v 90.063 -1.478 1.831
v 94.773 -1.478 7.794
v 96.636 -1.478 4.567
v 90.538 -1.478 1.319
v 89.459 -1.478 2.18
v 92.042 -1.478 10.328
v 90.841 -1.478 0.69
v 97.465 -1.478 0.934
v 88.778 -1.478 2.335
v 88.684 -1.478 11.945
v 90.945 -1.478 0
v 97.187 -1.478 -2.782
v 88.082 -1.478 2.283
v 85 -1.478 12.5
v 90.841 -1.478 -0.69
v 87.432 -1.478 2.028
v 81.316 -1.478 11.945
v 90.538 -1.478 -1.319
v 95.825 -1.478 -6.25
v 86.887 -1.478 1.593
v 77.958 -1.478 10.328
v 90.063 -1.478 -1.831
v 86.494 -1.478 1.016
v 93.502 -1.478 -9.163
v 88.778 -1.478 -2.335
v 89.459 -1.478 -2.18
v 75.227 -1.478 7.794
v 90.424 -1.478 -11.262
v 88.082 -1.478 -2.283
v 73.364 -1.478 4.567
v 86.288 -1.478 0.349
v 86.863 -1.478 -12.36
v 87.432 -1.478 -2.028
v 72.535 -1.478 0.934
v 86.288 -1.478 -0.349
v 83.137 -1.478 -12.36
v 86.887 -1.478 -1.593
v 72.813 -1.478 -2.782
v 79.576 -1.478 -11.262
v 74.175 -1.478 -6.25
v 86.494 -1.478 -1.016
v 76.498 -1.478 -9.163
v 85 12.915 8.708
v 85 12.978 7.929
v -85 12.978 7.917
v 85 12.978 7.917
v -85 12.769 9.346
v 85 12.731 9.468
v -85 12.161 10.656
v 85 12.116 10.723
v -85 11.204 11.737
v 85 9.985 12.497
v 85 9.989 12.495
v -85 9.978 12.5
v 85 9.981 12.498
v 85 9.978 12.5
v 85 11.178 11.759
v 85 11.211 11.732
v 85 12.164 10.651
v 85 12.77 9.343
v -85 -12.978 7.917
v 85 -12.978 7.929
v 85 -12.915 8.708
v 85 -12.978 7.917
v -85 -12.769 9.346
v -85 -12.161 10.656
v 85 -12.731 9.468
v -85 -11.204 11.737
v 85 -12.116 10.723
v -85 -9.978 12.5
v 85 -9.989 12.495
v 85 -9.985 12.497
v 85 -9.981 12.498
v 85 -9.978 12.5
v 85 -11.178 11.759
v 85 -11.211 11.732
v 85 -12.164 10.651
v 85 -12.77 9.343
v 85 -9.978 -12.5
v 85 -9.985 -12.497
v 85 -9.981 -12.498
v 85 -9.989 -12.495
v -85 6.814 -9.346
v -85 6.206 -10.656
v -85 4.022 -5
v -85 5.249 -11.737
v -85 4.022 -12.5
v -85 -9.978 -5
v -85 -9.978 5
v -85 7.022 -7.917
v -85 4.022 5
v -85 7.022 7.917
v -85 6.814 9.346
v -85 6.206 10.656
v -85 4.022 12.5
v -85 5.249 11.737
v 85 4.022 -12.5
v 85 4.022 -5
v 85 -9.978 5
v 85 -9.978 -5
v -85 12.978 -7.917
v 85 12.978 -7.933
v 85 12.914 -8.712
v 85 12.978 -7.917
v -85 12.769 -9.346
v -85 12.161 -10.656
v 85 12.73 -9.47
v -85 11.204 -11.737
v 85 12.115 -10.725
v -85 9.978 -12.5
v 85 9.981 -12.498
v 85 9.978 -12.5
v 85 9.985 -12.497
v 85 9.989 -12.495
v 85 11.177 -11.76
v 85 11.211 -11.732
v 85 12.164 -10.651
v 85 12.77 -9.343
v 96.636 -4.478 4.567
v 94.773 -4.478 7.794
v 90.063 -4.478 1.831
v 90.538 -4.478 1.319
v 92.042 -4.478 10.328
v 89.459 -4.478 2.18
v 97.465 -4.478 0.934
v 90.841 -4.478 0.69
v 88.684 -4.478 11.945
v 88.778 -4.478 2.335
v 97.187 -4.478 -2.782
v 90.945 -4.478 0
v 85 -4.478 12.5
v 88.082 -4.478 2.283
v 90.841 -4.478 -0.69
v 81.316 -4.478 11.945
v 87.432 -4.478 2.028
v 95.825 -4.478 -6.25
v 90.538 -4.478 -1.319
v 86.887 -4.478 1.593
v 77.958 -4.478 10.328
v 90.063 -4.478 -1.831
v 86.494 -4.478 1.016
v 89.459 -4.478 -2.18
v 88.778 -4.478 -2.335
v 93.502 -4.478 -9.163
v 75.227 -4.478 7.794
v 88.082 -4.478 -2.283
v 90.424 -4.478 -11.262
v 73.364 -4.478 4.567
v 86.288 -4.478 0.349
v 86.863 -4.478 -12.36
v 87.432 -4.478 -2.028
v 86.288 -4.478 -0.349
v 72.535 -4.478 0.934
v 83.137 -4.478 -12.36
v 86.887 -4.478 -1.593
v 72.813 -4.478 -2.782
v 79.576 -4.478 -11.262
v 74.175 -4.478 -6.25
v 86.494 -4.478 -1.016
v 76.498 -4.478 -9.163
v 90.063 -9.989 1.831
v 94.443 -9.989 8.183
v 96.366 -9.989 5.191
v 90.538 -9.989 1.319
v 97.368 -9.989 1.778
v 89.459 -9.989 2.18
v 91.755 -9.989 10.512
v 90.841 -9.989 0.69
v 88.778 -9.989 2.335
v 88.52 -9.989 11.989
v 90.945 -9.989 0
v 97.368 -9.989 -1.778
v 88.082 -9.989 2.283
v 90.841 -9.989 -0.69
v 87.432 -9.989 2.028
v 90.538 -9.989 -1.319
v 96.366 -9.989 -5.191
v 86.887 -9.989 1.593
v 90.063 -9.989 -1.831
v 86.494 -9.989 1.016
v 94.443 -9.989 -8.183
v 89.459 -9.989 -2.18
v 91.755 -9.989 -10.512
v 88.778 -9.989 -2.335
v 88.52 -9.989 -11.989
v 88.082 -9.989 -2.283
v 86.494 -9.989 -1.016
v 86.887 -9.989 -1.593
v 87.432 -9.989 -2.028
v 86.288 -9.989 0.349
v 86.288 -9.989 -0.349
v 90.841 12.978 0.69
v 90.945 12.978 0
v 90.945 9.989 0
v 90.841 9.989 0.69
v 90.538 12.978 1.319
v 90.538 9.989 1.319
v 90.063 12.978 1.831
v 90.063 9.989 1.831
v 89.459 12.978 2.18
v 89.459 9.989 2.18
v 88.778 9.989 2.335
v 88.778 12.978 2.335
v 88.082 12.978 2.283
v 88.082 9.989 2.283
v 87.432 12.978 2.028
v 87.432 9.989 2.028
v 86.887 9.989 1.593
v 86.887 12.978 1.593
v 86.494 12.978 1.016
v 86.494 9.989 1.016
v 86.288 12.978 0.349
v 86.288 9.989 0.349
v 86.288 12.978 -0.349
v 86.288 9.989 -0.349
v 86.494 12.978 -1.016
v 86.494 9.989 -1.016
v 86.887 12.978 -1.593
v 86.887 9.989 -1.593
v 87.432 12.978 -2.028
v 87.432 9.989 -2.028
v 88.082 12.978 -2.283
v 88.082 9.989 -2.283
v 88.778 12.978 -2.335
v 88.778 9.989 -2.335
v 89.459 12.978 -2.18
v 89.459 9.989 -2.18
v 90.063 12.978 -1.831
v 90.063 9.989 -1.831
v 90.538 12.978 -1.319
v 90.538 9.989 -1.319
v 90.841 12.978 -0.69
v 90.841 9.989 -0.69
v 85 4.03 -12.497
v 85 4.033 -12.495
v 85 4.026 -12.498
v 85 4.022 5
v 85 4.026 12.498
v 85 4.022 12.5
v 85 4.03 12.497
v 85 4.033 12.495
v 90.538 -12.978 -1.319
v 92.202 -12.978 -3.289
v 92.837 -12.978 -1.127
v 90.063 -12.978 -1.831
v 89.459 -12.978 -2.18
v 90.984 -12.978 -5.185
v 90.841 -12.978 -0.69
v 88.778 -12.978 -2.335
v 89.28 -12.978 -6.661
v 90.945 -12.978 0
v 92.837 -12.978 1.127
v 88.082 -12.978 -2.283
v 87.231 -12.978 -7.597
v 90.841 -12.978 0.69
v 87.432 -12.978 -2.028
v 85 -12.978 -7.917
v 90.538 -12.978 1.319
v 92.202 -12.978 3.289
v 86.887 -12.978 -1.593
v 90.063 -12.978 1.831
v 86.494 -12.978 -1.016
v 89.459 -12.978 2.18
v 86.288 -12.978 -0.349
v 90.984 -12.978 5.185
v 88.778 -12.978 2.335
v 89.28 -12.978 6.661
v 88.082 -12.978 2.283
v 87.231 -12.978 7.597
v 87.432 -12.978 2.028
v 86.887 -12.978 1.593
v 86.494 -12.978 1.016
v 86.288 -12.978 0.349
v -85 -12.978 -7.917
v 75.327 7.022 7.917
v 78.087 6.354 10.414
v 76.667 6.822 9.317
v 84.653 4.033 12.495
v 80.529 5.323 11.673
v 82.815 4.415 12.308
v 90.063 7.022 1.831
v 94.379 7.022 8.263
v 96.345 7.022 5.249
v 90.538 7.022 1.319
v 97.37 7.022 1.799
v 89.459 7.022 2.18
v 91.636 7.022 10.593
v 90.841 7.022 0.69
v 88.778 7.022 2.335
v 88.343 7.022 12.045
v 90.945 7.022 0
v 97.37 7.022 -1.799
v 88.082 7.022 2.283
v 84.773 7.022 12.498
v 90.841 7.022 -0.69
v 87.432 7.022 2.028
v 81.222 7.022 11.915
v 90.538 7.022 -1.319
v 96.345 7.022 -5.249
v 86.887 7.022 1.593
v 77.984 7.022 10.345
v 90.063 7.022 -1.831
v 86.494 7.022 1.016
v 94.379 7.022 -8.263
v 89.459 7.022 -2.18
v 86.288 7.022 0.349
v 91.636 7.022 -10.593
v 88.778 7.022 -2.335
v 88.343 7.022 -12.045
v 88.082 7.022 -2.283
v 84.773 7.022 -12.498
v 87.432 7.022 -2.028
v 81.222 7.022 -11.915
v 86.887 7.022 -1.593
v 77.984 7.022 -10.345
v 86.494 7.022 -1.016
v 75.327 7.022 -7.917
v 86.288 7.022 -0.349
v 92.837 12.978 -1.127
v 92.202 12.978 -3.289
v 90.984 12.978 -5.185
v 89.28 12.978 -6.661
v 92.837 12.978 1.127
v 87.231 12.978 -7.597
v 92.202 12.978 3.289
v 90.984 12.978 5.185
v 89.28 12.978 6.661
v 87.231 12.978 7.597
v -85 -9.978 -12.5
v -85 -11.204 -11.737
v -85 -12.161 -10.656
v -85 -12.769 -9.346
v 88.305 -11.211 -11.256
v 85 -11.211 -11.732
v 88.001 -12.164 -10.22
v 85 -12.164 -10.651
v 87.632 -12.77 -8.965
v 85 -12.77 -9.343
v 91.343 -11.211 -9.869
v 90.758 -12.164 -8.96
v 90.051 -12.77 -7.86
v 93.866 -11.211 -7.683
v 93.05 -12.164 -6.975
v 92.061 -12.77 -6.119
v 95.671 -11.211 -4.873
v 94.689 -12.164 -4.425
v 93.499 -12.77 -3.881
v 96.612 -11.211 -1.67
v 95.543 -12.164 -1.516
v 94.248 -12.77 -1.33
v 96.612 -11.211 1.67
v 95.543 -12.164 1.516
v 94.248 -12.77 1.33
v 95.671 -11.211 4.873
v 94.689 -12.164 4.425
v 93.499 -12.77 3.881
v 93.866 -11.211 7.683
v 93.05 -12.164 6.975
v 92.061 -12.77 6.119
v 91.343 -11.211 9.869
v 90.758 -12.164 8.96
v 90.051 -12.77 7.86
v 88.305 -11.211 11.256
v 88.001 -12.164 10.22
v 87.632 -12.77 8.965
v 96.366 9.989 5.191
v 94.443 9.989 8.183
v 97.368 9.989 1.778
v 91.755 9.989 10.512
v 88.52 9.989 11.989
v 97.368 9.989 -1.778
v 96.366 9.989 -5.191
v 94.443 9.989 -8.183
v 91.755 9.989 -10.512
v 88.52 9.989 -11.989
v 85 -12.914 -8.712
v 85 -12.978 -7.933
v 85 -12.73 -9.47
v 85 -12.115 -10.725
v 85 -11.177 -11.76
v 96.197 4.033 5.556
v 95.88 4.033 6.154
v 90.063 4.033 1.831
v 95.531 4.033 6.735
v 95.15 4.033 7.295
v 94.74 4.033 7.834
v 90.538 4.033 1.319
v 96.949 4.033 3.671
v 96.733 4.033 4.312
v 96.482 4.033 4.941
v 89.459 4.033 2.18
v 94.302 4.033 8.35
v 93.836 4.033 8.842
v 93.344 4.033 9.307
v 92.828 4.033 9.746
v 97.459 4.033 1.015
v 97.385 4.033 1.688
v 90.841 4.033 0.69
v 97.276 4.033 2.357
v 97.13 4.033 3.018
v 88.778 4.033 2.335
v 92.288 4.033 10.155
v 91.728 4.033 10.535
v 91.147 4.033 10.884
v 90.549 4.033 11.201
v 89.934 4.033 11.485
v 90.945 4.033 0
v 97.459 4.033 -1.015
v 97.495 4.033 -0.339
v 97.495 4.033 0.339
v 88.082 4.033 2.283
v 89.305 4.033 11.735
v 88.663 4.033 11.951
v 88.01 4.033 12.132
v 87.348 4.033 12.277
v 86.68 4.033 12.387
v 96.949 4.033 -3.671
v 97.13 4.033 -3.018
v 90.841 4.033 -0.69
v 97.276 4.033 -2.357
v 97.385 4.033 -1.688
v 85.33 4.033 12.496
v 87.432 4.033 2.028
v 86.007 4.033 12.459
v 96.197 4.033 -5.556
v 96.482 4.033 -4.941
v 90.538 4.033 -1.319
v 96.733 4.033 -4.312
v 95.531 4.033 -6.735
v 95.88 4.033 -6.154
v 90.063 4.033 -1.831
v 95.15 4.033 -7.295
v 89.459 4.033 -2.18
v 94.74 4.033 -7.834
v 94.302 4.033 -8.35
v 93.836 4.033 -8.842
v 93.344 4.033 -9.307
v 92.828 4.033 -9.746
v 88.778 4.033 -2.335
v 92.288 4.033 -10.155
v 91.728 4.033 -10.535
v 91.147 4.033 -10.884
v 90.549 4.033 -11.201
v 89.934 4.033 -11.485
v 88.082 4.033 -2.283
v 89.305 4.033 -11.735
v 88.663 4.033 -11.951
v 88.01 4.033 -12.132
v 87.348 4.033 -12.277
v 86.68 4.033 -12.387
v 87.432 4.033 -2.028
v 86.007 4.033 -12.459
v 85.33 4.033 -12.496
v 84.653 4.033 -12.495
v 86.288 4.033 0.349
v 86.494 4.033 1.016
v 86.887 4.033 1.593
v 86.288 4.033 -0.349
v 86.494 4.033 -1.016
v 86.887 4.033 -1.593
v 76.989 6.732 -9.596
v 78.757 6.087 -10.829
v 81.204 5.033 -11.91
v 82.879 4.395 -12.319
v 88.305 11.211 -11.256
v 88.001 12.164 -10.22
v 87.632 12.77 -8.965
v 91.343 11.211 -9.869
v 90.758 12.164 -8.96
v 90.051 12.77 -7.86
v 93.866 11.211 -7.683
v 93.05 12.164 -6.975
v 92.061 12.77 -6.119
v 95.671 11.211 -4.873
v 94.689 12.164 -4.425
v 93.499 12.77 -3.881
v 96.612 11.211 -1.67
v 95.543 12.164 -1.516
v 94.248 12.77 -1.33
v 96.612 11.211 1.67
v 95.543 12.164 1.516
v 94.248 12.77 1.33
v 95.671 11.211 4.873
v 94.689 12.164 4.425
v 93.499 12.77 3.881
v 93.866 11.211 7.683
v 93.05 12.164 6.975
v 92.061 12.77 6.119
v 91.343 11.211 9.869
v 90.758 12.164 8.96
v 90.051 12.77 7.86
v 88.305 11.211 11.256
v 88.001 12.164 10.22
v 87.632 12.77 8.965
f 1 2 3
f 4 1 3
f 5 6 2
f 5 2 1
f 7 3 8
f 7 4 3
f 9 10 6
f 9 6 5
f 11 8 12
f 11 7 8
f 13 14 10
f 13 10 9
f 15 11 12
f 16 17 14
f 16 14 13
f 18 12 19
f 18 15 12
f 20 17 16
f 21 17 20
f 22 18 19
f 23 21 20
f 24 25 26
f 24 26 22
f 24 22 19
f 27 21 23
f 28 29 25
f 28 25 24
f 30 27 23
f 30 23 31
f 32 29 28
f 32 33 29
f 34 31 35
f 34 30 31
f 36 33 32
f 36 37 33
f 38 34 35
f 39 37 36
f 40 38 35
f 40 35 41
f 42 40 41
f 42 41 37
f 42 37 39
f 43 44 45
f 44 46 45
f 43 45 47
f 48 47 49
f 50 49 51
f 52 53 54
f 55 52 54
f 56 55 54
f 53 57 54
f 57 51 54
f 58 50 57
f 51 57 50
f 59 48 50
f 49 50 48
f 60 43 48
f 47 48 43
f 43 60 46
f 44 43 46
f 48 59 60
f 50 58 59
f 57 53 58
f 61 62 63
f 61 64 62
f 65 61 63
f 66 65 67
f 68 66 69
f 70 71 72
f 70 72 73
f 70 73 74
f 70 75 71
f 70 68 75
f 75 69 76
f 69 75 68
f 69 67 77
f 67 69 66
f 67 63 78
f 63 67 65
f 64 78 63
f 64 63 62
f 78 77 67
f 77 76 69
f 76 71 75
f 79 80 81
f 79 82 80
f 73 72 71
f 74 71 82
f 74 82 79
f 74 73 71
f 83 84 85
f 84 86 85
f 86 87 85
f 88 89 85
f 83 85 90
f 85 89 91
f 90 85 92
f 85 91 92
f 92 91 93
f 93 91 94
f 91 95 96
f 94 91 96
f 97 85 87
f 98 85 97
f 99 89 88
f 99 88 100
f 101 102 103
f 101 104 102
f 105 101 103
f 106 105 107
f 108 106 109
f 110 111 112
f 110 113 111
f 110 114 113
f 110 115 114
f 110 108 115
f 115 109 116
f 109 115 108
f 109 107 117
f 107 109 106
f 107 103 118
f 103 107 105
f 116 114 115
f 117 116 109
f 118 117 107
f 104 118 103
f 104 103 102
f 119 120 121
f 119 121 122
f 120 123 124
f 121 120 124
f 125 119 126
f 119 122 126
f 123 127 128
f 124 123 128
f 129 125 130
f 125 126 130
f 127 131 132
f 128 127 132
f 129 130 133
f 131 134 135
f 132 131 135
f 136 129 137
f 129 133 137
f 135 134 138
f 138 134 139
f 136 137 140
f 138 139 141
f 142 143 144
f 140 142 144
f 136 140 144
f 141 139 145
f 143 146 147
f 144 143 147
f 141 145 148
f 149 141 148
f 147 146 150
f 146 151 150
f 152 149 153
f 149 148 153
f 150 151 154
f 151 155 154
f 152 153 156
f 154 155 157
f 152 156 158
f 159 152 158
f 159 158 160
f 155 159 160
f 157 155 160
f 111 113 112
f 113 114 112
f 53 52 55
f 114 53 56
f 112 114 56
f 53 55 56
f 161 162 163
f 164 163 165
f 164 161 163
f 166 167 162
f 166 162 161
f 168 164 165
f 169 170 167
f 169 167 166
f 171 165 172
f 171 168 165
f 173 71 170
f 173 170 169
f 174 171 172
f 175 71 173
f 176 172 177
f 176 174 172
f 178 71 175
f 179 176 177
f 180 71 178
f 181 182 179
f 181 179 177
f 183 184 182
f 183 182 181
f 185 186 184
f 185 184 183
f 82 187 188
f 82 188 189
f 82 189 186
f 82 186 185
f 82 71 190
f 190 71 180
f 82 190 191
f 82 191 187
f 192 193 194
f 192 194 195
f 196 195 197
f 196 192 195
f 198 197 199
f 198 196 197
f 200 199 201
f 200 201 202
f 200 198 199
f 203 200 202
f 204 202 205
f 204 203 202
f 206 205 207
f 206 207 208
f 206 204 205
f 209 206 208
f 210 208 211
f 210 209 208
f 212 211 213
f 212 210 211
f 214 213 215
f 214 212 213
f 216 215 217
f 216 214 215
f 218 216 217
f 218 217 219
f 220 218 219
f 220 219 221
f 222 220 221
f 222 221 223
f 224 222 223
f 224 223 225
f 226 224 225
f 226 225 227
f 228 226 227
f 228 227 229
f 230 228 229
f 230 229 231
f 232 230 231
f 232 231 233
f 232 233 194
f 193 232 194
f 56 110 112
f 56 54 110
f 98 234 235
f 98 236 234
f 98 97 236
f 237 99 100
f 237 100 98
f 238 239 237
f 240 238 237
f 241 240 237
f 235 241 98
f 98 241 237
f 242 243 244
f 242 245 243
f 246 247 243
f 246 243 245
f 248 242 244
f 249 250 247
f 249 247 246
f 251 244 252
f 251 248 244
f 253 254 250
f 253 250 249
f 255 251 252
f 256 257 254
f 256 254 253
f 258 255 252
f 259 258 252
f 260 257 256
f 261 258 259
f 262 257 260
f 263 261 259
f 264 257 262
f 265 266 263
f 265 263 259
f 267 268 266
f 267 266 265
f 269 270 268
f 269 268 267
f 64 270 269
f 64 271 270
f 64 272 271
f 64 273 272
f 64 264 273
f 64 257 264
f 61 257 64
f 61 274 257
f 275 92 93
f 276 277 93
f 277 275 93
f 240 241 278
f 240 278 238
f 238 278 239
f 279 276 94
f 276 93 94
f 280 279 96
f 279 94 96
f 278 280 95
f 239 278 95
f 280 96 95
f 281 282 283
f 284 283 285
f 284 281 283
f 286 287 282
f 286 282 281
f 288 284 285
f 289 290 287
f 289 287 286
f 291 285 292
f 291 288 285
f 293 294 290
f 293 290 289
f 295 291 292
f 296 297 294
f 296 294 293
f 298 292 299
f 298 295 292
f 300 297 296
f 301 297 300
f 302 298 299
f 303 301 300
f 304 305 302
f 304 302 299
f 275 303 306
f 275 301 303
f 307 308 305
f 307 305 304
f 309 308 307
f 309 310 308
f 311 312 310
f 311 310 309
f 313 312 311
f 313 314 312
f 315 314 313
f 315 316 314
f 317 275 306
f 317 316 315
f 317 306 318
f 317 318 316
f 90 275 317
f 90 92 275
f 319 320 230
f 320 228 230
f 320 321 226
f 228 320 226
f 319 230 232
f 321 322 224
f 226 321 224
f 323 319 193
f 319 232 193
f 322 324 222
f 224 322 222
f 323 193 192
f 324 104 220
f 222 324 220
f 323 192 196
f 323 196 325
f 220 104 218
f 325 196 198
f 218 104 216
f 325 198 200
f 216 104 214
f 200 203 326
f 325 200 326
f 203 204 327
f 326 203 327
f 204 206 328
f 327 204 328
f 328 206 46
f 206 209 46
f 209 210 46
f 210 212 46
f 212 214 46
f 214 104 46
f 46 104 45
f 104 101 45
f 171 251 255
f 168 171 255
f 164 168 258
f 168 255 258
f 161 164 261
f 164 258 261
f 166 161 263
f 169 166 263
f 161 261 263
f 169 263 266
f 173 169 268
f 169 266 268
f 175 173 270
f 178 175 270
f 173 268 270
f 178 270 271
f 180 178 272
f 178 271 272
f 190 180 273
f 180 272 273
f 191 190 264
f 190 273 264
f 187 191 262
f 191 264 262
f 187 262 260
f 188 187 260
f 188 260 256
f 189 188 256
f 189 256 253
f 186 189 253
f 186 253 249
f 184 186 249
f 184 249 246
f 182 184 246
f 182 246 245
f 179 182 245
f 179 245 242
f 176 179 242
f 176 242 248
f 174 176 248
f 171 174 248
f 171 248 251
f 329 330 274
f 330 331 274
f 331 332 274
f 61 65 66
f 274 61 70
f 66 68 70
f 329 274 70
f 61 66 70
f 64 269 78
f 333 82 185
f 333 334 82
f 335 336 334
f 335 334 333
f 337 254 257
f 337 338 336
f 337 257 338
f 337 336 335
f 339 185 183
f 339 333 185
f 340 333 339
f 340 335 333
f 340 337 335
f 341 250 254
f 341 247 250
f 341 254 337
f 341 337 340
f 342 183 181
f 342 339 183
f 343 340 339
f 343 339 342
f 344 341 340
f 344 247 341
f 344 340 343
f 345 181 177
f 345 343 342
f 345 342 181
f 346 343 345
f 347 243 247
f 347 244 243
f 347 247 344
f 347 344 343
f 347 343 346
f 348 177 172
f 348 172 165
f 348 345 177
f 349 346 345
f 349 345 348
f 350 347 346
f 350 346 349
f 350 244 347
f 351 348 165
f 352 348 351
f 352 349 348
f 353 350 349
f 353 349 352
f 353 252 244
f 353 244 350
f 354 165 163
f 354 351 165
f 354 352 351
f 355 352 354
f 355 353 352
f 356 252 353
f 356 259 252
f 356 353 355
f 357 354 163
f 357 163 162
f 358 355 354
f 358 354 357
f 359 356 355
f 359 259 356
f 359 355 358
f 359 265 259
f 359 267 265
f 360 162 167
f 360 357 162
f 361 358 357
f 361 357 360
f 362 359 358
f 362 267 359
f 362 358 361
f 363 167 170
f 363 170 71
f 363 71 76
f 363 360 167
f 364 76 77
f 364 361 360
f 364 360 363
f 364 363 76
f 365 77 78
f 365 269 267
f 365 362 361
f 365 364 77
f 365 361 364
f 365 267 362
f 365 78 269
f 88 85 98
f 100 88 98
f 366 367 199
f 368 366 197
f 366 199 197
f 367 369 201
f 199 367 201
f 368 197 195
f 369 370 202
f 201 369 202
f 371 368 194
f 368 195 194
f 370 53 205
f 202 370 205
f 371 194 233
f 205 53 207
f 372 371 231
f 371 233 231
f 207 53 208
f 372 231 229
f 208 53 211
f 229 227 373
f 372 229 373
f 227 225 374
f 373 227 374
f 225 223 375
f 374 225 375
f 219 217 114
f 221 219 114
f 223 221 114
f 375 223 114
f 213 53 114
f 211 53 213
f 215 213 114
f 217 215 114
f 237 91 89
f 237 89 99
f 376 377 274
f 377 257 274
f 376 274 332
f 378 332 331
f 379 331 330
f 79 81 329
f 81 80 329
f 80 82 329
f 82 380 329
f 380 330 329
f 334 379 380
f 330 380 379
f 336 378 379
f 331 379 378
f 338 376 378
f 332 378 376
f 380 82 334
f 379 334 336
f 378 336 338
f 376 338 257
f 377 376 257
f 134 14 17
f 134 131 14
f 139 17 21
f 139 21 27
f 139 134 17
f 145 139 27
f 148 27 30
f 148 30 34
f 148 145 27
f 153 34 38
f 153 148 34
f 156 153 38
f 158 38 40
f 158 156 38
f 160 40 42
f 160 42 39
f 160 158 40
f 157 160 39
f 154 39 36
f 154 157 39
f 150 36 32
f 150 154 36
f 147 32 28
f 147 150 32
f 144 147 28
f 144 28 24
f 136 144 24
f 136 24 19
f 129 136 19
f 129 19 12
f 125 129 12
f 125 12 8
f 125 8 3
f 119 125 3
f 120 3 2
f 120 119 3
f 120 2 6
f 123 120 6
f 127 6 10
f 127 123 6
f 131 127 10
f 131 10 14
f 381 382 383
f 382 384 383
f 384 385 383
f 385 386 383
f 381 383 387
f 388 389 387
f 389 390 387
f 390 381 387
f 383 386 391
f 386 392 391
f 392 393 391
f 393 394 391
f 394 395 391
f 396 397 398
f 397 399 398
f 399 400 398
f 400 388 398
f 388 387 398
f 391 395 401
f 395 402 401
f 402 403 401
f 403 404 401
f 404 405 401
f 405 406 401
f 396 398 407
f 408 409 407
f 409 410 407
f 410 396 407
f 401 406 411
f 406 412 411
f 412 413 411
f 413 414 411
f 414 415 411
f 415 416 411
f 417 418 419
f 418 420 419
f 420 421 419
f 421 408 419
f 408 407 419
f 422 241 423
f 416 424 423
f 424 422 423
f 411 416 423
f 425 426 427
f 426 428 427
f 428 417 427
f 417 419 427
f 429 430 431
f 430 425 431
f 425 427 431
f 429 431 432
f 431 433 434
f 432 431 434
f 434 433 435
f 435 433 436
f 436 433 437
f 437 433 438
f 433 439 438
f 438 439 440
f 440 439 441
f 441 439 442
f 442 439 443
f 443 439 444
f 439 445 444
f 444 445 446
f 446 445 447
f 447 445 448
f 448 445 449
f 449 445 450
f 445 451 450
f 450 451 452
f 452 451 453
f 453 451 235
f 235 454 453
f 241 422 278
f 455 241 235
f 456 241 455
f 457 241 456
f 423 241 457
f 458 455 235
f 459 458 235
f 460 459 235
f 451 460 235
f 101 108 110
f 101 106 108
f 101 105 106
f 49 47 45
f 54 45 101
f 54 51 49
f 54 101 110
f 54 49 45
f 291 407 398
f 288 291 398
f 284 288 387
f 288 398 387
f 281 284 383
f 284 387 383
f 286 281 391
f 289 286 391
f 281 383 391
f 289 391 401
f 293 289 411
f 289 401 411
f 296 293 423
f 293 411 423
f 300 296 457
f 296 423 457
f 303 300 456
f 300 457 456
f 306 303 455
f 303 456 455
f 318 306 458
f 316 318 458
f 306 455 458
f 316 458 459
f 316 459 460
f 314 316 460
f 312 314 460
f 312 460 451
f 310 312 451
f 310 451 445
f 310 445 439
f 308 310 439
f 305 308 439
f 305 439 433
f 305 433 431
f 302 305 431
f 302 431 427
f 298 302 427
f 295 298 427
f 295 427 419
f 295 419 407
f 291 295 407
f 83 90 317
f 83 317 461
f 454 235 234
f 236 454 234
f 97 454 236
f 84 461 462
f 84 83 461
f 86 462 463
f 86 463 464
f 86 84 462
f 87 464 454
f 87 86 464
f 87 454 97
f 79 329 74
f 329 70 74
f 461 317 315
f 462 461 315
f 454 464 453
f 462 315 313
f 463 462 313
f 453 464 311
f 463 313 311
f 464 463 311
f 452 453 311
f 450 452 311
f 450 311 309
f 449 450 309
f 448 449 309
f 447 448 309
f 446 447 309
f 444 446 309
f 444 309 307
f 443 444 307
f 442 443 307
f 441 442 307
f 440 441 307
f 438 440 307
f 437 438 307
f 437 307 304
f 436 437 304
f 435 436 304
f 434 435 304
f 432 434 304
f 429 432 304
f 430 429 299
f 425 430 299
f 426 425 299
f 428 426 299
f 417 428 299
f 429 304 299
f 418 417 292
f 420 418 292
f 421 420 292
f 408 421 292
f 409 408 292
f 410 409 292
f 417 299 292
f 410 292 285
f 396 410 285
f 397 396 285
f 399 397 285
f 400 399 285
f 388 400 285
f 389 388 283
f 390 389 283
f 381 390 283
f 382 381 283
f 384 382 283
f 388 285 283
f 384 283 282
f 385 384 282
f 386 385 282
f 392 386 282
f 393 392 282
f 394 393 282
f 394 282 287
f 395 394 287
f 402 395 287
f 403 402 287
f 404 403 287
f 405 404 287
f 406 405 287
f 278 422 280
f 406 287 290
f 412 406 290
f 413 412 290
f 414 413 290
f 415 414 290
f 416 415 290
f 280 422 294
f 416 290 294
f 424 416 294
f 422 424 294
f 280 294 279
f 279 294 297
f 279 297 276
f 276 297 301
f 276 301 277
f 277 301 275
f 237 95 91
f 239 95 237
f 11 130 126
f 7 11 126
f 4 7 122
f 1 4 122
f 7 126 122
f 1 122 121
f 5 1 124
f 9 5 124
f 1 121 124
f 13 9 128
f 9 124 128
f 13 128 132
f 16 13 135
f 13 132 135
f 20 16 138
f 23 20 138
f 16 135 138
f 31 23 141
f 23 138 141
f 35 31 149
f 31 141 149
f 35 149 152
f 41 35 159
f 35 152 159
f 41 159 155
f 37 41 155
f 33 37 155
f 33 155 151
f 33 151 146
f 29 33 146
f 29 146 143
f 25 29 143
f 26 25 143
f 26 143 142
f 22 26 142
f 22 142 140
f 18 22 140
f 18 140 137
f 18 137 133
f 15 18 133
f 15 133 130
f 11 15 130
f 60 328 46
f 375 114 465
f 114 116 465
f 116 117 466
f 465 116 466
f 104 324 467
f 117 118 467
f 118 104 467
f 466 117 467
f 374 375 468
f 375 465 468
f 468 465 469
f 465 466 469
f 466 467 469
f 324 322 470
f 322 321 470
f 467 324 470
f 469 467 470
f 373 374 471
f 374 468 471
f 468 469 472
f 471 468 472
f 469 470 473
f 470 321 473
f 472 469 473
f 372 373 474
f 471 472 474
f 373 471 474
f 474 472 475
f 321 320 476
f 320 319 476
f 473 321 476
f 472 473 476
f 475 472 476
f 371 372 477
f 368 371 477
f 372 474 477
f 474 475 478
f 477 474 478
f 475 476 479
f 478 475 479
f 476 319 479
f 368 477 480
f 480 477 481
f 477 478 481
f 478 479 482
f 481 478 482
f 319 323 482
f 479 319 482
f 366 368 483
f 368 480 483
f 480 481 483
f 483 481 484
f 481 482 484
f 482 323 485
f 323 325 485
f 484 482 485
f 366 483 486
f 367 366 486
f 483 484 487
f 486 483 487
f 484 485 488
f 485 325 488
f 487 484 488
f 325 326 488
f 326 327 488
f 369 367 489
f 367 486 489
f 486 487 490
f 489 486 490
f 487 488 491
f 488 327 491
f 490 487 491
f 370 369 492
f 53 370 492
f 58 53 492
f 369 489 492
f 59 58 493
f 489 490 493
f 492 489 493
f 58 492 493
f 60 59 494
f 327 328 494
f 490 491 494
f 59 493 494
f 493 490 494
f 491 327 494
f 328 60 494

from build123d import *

# Parameters (mm, degrees)
F0_W          = 170
F0_H          = 3
F1_DEPTH      = 12.5
F0_H_2        = 14
F2_DEPTH      = 5
F3_DEPTH      = 12.5
F4_T1_DEPTH   = 192.9128784748
F4_2_T1_DEPTH = 192.9128784748
F5_W          = 2.989
F5_H          = 12.5
F5_W_2        = 1.5
F8_R          = 2.3415273596
F9_DEPTH      = 20.0010001


# Not quite as in the source:
# - a fillet or chamfer that OpenCascade refuses, or shapes differently, is made with other operations: its cross-section is extruded or revolved along the edge and cut away or added
# - a feature names something its author has since deleted; it is built from what else it names


with BuildPart() as f1:
    # F0 (on Top) → F1 (new body, symmetric)
    with BuildSketch(Plane.XY):
        with Locations((0, -11.4776883987)):
            Rectangle(F0_W, F0_H)
    extrude(amount=F1_DEPTH, both=True)

    # F4: fillet of radius 5 on 2 edges, made by hand

    # F4_s2 → F4_t1 (cut)
    with BuildSketch(Plane.YZ.offset(-96.4564392374)):
        with BuildLine():
            ThreePointArc((-12.9776883987, -7.917424305), (-12.1609885313, -10.6560370926), (-9.9776883987, -12.5))
            Line((-9.9776883987, -12.5), (-12.9776883987, -12.5))
            Line((-12.9776883987, -12.5), (-12.9776883987, -7.917424305))
        make_face()
        with BuildLine():
            ThreePointArc((-12.9776883987, 7.917424305), (-12.1609885313, 10.6560370926), (-9.9776883987, 12.5))
            Line((-9.9776883987, 12.5), (-12.9776883987, 12.5))
            Line((-12.9776883987, 12.5), (-12.9776883987, 7.917424305))
        make_face()
    extrude(amount=F4_T1_DEPTH, mode=Mode.SUBTRACT)

    # F5 (on face) → F6, piece 2 (revolve)
    with BuildSketch(Plane.YZ.offset(85)):
        with BuildLine():
            Line((-9.9885491654, 0), (-9.9885491654, 12.4952446354))
            ThreePointArc((-9.9885491654, 12.4952446354), (-12.1642325483, 10.6510753587), (-12.9776883987, 7.917424305))
            Line((-12.9776883987, 7.917424305), (-12.9776883987, 0))
            Line((-12.9776883987, 0), (-12.6429592585, 0))
            Line((-12.6429592585, 0), (-9.9885491654, 0))
        make_face()
    revolve(axis=Axis((85, -2.9776883987, 0), (0, -1, 0)))


with BuildPart() as f2:
    # F0 (on Top) → F2 (new body, symmetric)
    with BuildSketch(Plane.XY):
        with Locations((0, -2.9776883987)):
            Rectangle(F0_W, F0_H_2)
    extrude(amount=F2_DEPTH, both=True)

    # F0 (on Top) → F3 (join, symmetric)
    with BuildSketch(Plane.XY):
        with Locations((0, 5.5223116013)):
            Rectangle(F0_W, F0_H)
    extrude(amount=F3_DEPTH, both=True)

    # F4#2: fillet of radius 5 on 2 edges, made by hand

    # F4_2_s2 → F4_2_t1 (cut)
    with BuildSketch(Plane.YZ.offset(-96.4564392374)):
        with BuildLine():
            ThreePointArc((7.0223116013, -7.917424305), (6.205611734, -10.6560370926), (4.0223116013, -12.5))
            Line((4.0223116013, -12.5), (7.0223116013, -12.5))
            Line((7.0223116013, -12.5), (7.0223116013, -7.917424305))
        make_face()
        with BuildLine():
            ThreePointArc((7.0223116013, 7.917424305), (6.205611734, 10.6560370926), (4.0223116013, 12.5))
            Line((4.0223116013, 12.5), (7.0223116013, 12.5))
            Line((7.0223116013, 12.5), (7.0223116013, 7.917424305))
        make_face()
    extrude(amount=F4_2_T1_DEPTH, mode=Mode.SUBTRACT)

    # F5 (on face) → F6 (revolve)
    with BuildSketch(Plane.YZ.offset(85)):
        with Locations((5.5278116013, 6.25)):
            Rectangle(F5_W, F5_H)
    revolve(axis=Axis((85, -2.9776883987, 0), (0, -1, 0)))


with BuildPart() as f7:
    # F5 (on face) → F7 (revolve)
    with BuildSketch(Plane.YZ.offset(85)):
        with Locations((-2.2276883987, 6.25)):
            Rectangle(F5_W_2, F5_H)
        with Locations((-3.7276883987, 6.25)):
            Rectangle(F5_W_2, F5_H)
    revolve(axis=Axis((85, -2.9776883987, 0), (0, -1, 0)))


with BuildPart() as f9_tool:
    # F8 (on face) → F9 (new body, through all)
    with BuildSketch(Plane.XZ.offset(12.9776883987)):
        with Locations((88.6031761765, 0)):
            Circle(F8_R)
    extrude(amount=-F9_DEPTH)


with BuildPart() as f1_1:
    add(f1.part)

    # F9: cut by f9_tool
    add(f9_tool.part, mode=Mode.SUBTRACT)


with BuildPart() as f2_1:
    add(f2.part)

    # F9: cut by f9_tool
    add(f9_tool.part, mode=Mode.SUBTRACT)


with BuildPart() as f7_1:
    add(f7.part)

    # F9: cut by f9_tool
    add(f9_tool.part, mode=Mode.SUBTRACT)


with BuildPart() as f10_1:
    # F10: instance of F1
    add(f1_1.part.mirror(Plane.XZ))


solid = Compound([f1_1.part, f2_1.part, f7_1.part, f10_1.part])
